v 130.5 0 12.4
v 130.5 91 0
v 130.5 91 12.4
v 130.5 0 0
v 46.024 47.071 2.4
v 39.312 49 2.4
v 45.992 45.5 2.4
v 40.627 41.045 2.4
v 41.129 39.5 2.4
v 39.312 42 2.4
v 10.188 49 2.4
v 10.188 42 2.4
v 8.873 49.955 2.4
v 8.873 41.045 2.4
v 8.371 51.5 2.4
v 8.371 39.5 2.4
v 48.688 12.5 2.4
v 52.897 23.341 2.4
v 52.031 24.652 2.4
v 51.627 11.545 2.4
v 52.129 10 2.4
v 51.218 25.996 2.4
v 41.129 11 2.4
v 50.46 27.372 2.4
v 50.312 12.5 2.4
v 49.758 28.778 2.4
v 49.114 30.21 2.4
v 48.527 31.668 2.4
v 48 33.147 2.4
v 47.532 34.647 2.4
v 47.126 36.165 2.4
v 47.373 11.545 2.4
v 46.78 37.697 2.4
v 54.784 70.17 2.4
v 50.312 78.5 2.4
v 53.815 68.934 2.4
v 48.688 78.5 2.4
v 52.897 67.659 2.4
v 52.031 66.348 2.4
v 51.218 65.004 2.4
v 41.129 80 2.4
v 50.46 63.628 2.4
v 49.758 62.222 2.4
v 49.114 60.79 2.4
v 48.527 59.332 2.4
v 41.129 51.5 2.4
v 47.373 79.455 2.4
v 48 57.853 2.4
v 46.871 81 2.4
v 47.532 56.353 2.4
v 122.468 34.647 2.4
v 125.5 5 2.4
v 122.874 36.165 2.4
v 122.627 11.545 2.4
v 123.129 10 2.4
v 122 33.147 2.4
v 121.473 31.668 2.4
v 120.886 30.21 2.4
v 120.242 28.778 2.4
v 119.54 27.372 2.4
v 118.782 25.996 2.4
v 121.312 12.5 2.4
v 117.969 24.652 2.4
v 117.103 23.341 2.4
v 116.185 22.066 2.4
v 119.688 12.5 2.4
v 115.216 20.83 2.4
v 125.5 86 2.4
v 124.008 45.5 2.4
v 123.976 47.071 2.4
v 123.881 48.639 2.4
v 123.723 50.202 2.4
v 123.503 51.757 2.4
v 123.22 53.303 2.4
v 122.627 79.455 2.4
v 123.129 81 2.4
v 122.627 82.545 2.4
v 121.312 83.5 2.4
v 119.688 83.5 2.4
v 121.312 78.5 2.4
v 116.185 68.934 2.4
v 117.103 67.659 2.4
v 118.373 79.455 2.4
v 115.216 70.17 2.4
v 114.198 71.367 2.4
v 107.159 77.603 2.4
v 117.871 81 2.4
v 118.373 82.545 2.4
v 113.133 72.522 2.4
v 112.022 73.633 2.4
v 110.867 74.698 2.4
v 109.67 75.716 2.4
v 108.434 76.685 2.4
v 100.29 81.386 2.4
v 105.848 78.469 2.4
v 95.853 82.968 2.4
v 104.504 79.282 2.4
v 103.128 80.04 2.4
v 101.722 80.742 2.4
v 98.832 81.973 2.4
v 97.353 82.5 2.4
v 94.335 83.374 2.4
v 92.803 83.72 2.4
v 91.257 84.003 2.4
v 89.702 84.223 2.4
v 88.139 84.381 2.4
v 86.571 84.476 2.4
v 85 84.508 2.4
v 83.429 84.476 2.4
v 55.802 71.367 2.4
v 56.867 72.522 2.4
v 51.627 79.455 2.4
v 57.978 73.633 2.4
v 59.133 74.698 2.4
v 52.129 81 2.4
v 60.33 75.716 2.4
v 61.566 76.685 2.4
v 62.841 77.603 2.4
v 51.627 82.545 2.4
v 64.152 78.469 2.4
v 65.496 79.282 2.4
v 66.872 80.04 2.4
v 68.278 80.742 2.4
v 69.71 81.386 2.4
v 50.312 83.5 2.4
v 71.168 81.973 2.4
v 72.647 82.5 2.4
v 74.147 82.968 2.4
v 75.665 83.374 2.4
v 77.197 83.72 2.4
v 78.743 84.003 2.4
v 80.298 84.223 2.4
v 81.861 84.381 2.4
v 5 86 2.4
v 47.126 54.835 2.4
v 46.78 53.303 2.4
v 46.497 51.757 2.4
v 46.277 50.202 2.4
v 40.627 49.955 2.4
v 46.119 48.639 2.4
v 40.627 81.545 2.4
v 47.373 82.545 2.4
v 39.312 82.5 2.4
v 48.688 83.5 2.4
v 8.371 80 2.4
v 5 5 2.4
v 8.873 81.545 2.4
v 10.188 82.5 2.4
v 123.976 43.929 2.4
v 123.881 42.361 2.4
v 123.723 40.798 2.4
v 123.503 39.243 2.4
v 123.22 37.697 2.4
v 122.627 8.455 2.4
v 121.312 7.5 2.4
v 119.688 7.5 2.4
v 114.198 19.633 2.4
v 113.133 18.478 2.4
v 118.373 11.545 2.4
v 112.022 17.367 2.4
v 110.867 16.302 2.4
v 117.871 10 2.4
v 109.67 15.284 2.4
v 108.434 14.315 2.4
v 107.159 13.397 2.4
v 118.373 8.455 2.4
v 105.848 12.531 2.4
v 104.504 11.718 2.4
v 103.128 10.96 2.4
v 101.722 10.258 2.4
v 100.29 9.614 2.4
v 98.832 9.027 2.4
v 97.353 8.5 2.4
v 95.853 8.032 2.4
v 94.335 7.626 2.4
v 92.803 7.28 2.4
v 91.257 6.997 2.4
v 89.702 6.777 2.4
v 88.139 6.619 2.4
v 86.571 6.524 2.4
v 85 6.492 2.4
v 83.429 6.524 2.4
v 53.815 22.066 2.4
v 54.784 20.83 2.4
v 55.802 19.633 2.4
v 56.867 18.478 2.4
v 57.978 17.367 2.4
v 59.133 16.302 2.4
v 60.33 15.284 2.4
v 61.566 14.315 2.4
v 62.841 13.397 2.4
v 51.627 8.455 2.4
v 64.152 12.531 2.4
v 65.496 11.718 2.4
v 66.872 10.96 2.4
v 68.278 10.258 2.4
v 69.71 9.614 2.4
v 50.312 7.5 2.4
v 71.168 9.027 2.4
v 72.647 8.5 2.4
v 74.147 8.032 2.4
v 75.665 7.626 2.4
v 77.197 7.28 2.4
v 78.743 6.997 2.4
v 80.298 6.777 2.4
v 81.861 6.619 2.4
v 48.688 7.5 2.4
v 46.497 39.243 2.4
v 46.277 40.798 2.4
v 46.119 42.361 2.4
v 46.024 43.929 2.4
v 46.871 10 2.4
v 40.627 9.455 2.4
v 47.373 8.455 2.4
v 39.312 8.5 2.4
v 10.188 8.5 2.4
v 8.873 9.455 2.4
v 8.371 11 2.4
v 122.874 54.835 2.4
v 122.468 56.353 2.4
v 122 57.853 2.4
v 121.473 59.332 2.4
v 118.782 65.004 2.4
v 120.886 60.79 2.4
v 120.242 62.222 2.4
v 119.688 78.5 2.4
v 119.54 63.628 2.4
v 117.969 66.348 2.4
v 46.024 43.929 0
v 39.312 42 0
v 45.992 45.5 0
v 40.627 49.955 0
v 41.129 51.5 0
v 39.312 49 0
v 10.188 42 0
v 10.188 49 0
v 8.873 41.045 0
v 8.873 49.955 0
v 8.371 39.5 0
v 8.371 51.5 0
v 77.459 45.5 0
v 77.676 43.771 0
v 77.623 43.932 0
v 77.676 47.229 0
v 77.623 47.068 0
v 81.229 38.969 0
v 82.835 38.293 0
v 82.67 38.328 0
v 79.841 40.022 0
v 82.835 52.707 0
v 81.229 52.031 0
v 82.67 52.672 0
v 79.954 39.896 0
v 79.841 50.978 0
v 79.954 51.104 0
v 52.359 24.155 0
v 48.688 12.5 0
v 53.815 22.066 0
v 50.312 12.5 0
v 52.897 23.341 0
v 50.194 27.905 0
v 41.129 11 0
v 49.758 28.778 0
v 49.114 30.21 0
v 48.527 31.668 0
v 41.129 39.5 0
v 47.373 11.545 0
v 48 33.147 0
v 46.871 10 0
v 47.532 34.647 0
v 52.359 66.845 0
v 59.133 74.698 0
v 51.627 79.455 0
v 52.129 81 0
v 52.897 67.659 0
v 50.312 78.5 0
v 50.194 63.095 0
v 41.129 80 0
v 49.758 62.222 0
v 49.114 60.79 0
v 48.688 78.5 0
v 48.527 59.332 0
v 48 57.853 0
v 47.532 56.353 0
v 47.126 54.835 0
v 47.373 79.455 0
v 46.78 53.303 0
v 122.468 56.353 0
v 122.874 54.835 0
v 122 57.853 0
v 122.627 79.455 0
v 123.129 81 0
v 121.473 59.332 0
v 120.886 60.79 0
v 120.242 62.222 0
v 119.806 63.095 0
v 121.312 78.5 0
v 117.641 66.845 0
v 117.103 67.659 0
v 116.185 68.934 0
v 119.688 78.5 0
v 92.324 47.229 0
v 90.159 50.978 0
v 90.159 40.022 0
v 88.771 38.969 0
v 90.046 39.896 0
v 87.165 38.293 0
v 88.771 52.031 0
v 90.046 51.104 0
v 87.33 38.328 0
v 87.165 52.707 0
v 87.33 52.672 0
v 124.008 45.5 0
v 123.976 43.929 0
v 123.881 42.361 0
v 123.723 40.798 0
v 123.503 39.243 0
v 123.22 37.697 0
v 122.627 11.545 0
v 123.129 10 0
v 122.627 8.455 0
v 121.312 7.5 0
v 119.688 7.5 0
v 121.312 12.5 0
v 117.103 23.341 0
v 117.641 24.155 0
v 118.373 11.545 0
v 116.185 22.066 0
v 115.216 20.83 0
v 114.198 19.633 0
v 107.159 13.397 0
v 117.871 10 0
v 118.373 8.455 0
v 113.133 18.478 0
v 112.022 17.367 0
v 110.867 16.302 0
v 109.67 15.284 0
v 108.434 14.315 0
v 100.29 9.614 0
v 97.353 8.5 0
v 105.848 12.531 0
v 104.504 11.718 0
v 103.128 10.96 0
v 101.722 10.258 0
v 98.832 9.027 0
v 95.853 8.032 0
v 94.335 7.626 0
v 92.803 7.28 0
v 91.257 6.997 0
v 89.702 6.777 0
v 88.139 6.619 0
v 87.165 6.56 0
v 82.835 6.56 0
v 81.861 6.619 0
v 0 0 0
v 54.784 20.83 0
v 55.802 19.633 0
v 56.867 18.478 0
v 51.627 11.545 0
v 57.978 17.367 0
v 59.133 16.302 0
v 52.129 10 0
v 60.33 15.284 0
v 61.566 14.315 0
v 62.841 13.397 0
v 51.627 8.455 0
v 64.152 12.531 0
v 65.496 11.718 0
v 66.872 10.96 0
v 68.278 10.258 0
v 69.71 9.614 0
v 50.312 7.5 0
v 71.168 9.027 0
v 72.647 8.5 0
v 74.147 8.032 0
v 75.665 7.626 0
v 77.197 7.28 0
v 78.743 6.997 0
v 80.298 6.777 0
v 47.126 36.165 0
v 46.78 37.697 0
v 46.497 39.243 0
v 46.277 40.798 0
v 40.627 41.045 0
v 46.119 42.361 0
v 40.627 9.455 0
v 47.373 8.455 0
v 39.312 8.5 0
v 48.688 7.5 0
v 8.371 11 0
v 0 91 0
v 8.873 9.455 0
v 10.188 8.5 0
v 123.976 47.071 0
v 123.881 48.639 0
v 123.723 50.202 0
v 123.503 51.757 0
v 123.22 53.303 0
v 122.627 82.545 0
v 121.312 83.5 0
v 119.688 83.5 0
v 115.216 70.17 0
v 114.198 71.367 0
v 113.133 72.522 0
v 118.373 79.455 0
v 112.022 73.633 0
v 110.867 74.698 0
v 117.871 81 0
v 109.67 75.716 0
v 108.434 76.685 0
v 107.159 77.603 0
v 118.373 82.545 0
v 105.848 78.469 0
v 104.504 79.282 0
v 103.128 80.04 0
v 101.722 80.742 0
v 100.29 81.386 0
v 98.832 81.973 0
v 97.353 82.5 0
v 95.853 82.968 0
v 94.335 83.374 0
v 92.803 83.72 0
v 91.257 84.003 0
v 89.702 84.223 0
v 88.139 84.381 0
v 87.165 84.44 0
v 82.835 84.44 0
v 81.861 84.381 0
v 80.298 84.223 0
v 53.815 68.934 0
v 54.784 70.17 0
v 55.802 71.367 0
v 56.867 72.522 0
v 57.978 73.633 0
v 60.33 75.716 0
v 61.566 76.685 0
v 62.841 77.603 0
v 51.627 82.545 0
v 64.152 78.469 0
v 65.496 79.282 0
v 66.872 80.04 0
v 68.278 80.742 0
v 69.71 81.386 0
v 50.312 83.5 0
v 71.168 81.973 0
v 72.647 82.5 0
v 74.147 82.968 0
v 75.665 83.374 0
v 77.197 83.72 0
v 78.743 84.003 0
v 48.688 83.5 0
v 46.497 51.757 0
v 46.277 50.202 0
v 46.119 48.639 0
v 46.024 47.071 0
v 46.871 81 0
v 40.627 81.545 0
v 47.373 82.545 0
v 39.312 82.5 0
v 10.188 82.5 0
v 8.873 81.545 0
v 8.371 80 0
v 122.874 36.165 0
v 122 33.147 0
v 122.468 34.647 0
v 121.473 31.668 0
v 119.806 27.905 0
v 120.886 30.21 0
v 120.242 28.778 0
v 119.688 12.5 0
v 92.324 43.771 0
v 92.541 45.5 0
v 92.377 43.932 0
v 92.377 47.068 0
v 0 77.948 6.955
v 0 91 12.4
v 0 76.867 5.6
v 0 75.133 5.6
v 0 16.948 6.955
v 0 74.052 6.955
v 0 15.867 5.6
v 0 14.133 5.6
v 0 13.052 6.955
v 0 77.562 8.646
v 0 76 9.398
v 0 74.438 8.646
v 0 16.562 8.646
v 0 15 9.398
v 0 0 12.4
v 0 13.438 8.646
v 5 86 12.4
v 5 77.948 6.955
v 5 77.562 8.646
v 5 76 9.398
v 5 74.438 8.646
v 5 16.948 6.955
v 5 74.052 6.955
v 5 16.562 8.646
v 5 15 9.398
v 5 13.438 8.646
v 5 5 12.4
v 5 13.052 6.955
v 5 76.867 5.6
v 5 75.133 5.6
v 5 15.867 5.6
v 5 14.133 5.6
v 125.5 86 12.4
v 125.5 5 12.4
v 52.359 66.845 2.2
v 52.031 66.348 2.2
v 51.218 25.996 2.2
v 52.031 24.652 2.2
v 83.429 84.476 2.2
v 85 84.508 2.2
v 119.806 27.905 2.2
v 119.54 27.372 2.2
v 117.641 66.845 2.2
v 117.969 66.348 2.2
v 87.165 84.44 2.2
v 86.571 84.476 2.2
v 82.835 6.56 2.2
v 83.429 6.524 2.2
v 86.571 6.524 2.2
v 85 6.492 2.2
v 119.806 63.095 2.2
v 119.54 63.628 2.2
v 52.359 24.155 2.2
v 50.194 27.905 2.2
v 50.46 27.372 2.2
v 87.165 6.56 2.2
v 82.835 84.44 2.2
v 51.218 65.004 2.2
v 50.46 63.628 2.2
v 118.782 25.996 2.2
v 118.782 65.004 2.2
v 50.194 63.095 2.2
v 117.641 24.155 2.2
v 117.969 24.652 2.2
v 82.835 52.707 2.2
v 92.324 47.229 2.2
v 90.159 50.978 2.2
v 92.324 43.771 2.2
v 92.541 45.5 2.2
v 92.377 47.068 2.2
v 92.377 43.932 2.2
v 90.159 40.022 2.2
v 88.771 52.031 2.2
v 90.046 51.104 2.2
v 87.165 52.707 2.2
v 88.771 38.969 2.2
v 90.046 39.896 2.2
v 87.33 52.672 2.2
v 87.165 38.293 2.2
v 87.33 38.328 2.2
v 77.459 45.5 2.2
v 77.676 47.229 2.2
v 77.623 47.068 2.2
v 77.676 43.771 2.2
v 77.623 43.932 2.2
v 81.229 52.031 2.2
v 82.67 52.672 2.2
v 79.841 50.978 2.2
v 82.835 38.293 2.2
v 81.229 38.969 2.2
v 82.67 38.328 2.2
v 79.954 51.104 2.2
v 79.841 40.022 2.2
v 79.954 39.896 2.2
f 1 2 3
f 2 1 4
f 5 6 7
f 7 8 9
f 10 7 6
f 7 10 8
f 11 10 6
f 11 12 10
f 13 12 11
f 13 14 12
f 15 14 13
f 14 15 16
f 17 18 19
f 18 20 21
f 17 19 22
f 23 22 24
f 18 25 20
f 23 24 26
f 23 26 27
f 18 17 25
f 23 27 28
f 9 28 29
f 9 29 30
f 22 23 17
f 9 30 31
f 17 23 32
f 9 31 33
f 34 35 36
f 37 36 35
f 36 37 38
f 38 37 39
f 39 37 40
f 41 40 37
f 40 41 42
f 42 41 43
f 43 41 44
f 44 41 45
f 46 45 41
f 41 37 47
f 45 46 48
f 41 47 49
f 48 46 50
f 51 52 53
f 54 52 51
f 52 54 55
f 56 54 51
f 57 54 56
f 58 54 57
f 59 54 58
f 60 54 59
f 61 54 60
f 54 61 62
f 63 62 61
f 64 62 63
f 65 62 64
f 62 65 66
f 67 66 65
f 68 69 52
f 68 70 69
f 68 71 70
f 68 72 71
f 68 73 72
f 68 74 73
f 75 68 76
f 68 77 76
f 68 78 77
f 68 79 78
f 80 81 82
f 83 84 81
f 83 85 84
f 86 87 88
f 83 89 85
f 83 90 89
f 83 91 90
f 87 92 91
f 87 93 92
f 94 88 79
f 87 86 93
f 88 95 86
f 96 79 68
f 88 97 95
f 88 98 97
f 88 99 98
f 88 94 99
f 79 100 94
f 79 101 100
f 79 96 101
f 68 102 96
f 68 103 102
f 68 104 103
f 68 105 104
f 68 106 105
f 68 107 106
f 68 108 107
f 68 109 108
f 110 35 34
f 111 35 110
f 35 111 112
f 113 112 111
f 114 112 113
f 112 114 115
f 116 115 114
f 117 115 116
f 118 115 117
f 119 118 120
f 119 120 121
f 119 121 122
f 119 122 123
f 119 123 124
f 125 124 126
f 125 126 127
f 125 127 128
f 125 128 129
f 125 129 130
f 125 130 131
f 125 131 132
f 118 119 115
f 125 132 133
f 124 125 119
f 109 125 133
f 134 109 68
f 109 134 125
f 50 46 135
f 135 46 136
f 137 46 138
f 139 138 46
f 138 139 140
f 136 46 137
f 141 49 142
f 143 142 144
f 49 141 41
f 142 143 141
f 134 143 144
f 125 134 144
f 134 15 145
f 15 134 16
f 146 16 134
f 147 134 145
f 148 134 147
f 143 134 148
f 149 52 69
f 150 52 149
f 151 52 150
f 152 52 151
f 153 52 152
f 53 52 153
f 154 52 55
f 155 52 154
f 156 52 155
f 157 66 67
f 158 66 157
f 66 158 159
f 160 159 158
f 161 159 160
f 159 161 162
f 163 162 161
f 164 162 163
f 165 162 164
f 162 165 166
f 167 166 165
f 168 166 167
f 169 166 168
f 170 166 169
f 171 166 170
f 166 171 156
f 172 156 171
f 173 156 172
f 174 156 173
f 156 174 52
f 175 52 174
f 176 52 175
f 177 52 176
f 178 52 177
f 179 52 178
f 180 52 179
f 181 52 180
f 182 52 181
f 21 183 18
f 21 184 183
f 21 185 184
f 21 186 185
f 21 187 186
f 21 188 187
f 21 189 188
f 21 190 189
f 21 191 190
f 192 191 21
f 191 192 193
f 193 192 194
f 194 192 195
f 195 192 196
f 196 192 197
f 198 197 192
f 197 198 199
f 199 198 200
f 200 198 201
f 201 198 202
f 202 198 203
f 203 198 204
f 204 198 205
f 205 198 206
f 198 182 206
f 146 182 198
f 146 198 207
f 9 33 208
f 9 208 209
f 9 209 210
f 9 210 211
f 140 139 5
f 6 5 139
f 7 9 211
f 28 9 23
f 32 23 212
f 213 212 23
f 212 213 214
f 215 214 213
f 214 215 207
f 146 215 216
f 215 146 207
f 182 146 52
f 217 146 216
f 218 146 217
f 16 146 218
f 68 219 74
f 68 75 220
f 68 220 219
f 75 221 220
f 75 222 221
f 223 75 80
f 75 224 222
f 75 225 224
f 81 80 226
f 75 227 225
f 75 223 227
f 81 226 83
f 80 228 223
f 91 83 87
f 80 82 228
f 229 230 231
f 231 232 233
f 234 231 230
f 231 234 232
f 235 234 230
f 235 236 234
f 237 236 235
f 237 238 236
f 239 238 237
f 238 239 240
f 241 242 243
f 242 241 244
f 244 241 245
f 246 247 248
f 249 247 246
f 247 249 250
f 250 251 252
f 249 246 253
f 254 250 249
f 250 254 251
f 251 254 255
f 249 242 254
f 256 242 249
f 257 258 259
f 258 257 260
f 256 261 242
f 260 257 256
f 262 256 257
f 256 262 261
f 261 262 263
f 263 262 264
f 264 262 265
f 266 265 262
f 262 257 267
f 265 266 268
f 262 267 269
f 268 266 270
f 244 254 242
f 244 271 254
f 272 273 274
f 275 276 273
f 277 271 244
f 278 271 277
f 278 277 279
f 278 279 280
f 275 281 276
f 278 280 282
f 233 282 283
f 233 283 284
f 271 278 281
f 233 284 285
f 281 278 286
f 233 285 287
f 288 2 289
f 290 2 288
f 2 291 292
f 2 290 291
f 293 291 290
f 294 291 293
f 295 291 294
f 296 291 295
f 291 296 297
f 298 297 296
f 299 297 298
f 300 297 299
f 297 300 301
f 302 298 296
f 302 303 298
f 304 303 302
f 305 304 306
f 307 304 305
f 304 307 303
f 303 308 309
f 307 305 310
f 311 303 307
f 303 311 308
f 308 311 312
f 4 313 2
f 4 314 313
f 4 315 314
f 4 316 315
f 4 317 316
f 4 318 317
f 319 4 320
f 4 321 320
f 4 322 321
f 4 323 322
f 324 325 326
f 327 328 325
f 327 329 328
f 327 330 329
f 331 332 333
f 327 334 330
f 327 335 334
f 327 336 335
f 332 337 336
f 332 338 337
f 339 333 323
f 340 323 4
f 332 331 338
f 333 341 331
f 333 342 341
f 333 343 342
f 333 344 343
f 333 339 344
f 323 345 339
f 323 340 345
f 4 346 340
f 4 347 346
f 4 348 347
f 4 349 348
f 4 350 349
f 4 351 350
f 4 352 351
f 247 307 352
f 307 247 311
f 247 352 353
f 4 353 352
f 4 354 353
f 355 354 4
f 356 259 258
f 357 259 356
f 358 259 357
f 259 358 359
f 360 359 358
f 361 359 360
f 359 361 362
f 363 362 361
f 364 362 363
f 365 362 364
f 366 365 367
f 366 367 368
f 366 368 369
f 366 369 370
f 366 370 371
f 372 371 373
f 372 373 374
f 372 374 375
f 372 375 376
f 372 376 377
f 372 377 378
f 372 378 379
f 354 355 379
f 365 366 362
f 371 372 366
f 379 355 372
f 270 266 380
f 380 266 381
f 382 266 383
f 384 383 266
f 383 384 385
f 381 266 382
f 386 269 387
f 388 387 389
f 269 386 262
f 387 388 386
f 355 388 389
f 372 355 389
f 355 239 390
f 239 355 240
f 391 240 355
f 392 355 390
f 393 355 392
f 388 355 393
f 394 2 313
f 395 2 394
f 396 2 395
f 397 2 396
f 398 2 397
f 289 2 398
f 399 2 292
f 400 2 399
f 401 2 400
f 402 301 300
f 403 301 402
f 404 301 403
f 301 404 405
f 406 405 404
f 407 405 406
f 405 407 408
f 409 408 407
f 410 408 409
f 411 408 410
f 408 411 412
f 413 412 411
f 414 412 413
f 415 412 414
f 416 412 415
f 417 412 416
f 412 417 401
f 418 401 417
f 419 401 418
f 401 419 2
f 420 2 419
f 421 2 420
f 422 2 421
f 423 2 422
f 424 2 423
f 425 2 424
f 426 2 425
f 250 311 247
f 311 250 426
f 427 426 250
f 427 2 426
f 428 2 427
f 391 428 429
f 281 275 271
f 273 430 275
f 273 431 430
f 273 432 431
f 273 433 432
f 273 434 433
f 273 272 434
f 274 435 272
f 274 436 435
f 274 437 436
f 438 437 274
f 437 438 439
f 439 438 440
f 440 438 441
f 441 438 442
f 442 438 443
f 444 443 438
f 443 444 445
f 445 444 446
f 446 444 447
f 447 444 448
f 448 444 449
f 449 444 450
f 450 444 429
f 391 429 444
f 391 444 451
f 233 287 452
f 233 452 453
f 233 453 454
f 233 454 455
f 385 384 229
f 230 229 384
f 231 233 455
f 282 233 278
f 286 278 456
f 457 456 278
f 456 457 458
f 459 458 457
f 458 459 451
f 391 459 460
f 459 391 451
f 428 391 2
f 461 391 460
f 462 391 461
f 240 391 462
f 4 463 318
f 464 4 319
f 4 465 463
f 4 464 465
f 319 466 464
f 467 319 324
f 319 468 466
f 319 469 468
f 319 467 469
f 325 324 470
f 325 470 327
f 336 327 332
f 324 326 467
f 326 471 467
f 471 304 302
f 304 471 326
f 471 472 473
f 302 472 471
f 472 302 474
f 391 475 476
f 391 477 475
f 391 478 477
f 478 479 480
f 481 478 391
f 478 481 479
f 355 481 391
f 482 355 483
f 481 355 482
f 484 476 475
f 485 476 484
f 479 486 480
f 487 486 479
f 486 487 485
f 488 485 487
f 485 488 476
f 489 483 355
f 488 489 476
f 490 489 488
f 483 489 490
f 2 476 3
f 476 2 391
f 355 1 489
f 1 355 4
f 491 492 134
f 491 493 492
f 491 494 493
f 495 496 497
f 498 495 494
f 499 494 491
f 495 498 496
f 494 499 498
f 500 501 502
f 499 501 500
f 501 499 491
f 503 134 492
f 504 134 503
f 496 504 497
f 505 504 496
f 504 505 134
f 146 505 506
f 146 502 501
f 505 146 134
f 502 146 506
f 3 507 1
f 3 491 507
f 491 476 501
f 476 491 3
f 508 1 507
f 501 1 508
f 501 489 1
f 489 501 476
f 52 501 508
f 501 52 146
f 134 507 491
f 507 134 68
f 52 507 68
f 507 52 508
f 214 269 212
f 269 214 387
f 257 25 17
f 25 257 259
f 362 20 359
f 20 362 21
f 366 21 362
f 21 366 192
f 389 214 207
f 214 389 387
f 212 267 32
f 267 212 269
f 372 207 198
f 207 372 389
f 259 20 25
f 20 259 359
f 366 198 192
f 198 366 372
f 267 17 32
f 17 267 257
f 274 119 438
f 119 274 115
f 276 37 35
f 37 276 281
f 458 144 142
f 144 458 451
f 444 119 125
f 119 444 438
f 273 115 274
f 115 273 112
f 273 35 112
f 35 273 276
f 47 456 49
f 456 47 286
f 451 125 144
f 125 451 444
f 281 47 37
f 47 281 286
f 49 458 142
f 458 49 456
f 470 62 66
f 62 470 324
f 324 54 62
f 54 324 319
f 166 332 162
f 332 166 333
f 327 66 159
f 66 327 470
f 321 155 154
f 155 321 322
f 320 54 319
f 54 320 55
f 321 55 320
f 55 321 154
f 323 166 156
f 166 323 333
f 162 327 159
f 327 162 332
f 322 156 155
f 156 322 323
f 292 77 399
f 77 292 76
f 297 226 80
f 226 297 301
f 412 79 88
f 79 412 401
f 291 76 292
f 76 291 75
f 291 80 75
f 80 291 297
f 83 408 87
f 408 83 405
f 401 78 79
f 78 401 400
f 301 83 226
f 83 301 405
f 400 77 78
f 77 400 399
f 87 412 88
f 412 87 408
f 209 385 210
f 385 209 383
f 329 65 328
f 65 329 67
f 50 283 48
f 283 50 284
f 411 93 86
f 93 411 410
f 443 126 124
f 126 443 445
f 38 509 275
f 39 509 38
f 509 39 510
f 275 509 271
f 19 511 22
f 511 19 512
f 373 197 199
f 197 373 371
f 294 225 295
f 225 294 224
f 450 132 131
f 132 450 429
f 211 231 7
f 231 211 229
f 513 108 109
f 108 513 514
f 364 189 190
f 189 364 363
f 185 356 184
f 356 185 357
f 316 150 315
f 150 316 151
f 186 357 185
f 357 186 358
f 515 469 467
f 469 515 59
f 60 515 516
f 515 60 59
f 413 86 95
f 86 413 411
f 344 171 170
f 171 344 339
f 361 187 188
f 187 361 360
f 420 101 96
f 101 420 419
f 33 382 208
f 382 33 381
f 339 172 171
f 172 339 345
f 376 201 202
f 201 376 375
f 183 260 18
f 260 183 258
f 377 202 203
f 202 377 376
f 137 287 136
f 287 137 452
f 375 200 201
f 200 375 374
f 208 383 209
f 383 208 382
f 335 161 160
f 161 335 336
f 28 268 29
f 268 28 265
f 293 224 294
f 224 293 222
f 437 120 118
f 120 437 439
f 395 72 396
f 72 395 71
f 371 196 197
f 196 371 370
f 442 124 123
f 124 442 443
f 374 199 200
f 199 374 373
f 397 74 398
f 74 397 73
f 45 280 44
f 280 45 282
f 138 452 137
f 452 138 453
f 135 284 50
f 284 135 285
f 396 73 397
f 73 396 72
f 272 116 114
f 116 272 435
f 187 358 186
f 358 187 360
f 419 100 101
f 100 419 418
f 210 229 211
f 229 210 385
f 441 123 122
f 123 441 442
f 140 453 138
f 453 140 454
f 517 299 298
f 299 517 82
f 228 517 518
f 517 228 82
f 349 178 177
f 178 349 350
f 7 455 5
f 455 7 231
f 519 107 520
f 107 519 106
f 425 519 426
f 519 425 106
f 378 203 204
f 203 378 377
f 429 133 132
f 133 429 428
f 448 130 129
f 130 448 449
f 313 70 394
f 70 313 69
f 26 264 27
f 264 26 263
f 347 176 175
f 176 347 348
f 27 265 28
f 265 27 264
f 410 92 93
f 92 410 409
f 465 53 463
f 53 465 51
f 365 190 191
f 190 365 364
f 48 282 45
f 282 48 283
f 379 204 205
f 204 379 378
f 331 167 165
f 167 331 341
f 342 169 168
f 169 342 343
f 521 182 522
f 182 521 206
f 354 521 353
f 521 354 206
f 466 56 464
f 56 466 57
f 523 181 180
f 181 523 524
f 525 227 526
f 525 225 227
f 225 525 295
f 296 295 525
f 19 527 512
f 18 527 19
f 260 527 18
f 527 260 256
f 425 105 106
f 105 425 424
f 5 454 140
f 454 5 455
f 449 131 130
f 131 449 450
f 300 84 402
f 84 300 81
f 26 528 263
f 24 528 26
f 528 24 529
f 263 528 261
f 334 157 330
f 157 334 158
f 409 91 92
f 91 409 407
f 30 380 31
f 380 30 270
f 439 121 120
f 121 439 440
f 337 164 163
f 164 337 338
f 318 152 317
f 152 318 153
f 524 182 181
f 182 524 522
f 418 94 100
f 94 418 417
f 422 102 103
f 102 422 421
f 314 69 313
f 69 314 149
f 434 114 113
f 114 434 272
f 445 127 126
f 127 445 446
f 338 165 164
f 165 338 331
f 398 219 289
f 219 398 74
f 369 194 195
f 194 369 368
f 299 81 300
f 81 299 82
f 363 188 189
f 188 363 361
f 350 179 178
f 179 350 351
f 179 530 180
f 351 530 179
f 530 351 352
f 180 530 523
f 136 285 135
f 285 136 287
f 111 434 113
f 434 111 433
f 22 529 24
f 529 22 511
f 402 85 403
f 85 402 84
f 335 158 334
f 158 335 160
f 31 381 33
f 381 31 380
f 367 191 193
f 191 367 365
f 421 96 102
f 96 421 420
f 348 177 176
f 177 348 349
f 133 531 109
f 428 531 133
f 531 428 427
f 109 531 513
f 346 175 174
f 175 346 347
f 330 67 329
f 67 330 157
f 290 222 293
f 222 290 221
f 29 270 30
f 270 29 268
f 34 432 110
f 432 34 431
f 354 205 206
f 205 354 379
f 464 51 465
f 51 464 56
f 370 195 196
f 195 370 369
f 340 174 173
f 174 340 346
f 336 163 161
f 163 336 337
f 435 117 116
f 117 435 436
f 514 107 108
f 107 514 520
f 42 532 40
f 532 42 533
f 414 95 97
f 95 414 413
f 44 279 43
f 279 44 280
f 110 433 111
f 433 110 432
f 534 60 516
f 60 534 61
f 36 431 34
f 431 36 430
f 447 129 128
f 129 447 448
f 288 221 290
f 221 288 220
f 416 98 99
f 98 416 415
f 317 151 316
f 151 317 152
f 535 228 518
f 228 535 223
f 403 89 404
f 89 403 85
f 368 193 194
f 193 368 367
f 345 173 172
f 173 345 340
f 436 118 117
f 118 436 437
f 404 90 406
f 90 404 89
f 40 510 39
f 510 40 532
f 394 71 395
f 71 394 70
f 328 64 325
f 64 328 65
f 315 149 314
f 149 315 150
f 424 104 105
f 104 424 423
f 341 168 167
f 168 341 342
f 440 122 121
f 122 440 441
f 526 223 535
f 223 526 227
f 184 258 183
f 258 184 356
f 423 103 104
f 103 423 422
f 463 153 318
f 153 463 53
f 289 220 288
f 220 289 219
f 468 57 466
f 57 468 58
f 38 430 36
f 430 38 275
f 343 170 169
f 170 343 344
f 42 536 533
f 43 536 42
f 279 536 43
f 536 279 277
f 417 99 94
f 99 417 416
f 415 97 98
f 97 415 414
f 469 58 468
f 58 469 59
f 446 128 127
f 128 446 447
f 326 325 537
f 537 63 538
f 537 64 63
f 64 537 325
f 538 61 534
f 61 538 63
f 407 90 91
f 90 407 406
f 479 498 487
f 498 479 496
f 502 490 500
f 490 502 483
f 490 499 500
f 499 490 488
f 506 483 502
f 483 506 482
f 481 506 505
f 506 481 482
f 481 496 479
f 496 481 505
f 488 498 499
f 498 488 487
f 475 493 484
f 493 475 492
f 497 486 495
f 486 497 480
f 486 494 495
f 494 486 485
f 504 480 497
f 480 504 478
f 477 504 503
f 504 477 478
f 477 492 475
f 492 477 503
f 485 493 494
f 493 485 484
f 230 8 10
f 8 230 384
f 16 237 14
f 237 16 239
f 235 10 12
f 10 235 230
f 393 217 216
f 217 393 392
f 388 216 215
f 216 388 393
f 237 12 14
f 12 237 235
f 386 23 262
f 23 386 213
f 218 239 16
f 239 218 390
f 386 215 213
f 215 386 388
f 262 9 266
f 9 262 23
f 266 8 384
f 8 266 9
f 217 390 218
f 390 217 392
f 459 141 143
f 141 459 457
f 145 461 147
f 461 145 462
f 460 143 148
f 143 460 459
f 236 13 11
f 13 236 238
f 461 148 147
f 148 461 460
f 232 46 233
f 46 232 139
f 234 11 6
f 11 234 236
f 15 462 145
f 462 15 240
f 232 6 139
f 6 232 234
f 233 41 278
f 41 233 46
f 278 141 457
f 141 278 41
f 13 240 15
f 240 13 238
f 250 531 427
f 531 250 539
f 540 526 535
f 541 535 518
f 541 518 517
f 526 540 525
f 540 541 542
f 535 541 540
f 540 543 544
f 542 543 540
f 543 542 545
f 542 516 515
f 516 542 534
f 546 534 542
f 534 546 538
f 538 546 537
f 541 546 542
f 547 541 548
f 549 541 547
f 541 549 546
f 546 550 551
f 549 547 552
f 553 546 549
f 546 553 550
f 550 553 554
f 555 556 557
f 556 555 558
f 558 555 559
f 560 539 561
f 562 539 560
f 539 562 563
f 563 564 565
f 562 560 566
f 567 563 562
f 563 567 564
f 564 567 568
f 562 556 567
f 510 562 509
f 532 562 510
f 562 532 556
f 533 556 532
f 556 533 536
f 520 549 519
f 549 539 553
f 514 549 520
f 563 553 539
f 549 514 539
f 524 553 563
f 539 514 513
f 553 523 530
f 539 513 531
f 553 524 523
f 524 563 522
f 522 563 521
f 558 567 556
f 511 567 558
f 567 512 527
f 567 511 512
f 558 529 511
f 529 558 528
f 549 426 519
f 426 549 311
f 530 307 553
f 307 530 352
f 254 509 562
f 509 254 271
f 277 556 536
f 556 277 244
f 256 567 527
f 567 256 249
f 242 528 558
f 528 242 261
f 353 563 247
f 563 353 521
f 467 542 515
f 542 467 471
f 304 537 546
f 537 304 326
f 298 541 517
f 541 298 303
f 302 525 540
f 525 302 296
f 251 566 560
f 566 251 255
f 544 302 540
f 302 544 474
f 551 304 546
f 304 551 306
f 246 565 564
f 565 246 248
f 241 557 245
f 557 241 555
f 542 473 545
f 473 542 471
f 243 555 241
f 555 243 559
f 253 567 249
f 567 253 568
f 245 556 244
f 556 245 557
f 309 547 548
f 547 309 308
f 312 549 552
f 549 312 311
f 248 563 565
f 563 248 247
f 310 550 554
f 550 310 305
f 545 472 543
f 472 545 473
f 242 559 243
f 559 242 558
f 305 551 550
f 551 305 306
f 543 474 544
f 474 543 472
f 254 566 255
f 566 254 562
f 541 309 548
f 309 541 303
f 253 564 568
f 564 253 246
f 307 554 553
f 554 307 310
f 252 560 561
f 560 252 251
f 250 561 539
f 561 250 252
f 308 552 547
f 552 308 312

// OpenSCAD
//-----------------------------------------------------------------------------------
// fan holder for custom mendel 90
// can be mounted on RHS of mendel 90 for cooling 
// sanguinololu/stepper drivers
//
// see https://github.com/Stemer114/things/tree/master/reprap
// (c) 2013 by Stemer114
// License: licensed under the Creative Commons - GNU GPL license.
//          http://www.gnu.org/licenses/gpl-2.0.html
//-----------------------------------------------------------------------------------

//-----------------------------------------------------------------------------------
//display settings
//-----------------------------------------------------------------------------------

//color settings

//-----------------------------------------------------------------------------------
//global configuration settings
//-----------------------------------------------------------------------------------
de = 0.1; //delta param, so differences are scaled and do not become manifold
fn_hole = 12;  //fn setting for round holes/bores (polyhole)
ex = 0;  //offset for Explosivdarstellung, set to 0 for none
ly = 0.4;  //layer thickness for printing

//-----------------------------------------------------------------------------------
//configuration settings
//-----------------------------------------------------------------------------------

P01 = 80;      //fan size
P02 = 1;       //offset for loose fit of fan
P1 = P01+P02;  //calulated fan size for loose fit
P2 = 85;       //fan offset (distance from mounting wall to middle of fan)

P3 = 5;   //outer wall thickness
P4 = 10;  //outer wall height
P5 = ly * 6; //base plate thickness (default 10 layers giving 4mm)

P10 = 3.6;  //mounting holes (wall) diameter
P11 = 15;   //mounting holes offset from side

P20 = 5;    //fan mounting holes diameter
P21 = 4+P02;    //fan mounting holes offset from edge
P22 = 78;   //fanguard cutout

//fanguard settings
P30 = 4;    //spoke outer dia
P31 = 4;    //spoke inner dia
P32 = P1/2; //spoke length
P33 = 2;    //spoke thickness
P34 = 6;    //spoke count
P35 = 15;   //center piece dia

//holder cutout (beside fan)
P40 = 5;  //corner diameter
P41 = 6;  //corner offset from frame
P42 = P2-P1/2-P3; //cutout dimension in x-direction (calculated)
P43 = P1/2;         //cutout dimension in y-direction (calculated)
 
//-----------------------------------------------------------------------------------
// libraries
//-----------------------------------------------------------------------------------
//include <lib/common.scad>

//-----------------------------------------------------------------------------------
// main rendering
//-----------------------------------------------------------------------------------


//transparent 10mm cube for debugging
//translate([0, 0, -10])
//% cube(10, 10, 10);

Holder();

translate([P2, P3+P1/2, 0])
    FanGuard();


//-----------------------------------------------------------------------------------
// modules
//-----------------------------------------------------------------------------------

module Holder()
{
    difference()
    {
        union()
        {
            //base plate
            translate([0, 0, 0])
                cube([P2+P1/2+P3, P1+2*P3, P5], center=false);

            //frame walls
            //fixing side
            translate([0, 0, P5])
                cube([P3, P1+2*P3, P4], center=false);
            //lateral walls
            translate([0, 0, P5])
                cube([P2+P1/2+P3, P3, P4], center=false);
            translate([0, P3+P1, P5])
                cube([P2+P1/2+P3, P3, P4], center=false);
            //fans side
            translate([P2+P1/2, 0, P5])
                cube([P3, P1+2*P3, P4], center=false);
 


        }  //end union

        union()
        {
            //mounting holes (wall side)
            translate([-de, P11, P5+P4/2])
                rotate([0, 90, 0])
                polyhole(P3+2*de, P10);
            translate([-de, P1+2*P3-P11, P5+P4/2])
                rotate([0, 90, 0])
                polyhole(P3+2*de, P10);

            //fan mounting holes and fanguard cutout
            translate([P2, P3+P1/2, 0])
            {
                translate([-P1/2+P21, -P1/2+P21, -de]) polyhole(P5+2*de, P20);
                translate([-P1/2+P21, +P1/2-P21, -de]) polyhole(P5+2*de, P20);
                translate([+P1/2-P21, -P1/2+P21, -de]) polyhole(P5+2*de, P20);
                translate([+P1/2-P21, +P1/2-P21, -de]) polyhole(P5+2*de, P20);

                translate([0, 0, -de]) polyhole(P5+2*de, P22);
            }
 
            //base plate cutout (twice)
            translate([P3+P42/2, P3+P43/2, 0])
            {
                hull() {
                    translate([-P42/2+P41, -P43/2+P41, -de]) polyhole(P5+2*de, P40);
                    translate([-P42/2+P41, +P43/2-P41, -de]) polyhole(P5+2*de, P40);
                    translate([+P42/2-P41, -P43/2+P41, -de]) polyhole(P5+2*de, P40);
                    translate([+P42/2-P41, +P43/2-P41, -de]) polyhole(P5+2*de, P40);
                }
            }
            translate([P3+P42/2, P3+P43*3/2, 0])
            {
                hull() {
                    translate([-P42/2+P41, -P43/2+P41, -de]) polyhole(P5+2*de, P40);
                    translate([-P42/2+P41, +P43/2-P41, -de]) polyhole(P5+2*de, P40);
                    translate([+P42/2-P41, -P43/2+P41, -de]) polyhole(P5+2*de, P40);
                    translate([+P42/2-P41, +P43/2-P41, -de]) polyhole(P5+2*de, P40);
                }
            }
 

            /*
            //slot for rod
            hull() {
            translate([-P5/2+P6, 0, -de])
            polyhole(P22+2*de, P5);
            translate([-de, -P5/2, -de])
            cube([10*de, P5, P22+2*de], center=false);
            }

            //cutout in holder
            hull() {
            translate([(P7-2*P101)/2+P8, 0, -de])
            polyhole(P22+2*de, P7-2*P101);
            translate([-10*de+P1, -(P4-2*P102)/2, -de])
            cube([10*de, P4-2*P102, P22+2*de], center=false);
            }
             */

        } //end union

    }  //end difference
}  //end module HolderBase


//fanguard, 
//will be inserted into fan cutout
module FanGuard()
{
    difference()
    {
        union()
        {

            //spokes
            for ( i = [0 : P34-1] )
            {
                rotate( [0, 0, i * 360 / P34]) translate([0, 0, 0])
                    hull() {
                        translate([0, P32, 0])
                            polyhole(P33+2*de, P30);
                        translate([0, 0, 0])
                            polyhole(P33+2*de, P31);
                    }
            }

            //center piece
            polyhole(P33+2*de, P35);

        }

        union()
        {

        }
    }
}


//-----------------------------------------------------------------------------------
// utility functions
//-----------------------------------------------------------------------------------

//polyhole by nophead
//see http://hydraraptor.blogspot.de/2011/02/polyholes.html
module polyhole(h, d) {
    n = max(round(2 * d),3);
    rotate([0,0,180])
        cylinder(h = h, r = (d / 2) / cos (180 / n), $fn = n);
}


/* creates a cube with rounded corners in z direction
   with the corners array it can be specified, which corners are rounded
   (default: all)
   */
module CubeRounded(x, y, z, r, corners=[1, 1, 1, 1]) {
    $fn=20;

    hull() {
        //lower left
        translate([r, r, 0]) 
            CubeCorner(r, z, corners[0]);

        //lower right
        translate([x-r, r, 0])
            CubeCorner(r, z, corners[1]);

        //upper left
        translate([r, y-r, 0])
            CubeCorner(r, z, corners[2]);

        //upper right
        translate([x-r, y-r, 0])
            CubeCorner(r, z, corners[3]);
    }
}

module CubeCorner(r, z, cornermode) {
    if (cornermode==1) {
        cylinder(h=z, r=r);
    } else {
        translate([0, 0, z/2])
            cube([2*r, 2*r, z], center=true);
    }
} 
